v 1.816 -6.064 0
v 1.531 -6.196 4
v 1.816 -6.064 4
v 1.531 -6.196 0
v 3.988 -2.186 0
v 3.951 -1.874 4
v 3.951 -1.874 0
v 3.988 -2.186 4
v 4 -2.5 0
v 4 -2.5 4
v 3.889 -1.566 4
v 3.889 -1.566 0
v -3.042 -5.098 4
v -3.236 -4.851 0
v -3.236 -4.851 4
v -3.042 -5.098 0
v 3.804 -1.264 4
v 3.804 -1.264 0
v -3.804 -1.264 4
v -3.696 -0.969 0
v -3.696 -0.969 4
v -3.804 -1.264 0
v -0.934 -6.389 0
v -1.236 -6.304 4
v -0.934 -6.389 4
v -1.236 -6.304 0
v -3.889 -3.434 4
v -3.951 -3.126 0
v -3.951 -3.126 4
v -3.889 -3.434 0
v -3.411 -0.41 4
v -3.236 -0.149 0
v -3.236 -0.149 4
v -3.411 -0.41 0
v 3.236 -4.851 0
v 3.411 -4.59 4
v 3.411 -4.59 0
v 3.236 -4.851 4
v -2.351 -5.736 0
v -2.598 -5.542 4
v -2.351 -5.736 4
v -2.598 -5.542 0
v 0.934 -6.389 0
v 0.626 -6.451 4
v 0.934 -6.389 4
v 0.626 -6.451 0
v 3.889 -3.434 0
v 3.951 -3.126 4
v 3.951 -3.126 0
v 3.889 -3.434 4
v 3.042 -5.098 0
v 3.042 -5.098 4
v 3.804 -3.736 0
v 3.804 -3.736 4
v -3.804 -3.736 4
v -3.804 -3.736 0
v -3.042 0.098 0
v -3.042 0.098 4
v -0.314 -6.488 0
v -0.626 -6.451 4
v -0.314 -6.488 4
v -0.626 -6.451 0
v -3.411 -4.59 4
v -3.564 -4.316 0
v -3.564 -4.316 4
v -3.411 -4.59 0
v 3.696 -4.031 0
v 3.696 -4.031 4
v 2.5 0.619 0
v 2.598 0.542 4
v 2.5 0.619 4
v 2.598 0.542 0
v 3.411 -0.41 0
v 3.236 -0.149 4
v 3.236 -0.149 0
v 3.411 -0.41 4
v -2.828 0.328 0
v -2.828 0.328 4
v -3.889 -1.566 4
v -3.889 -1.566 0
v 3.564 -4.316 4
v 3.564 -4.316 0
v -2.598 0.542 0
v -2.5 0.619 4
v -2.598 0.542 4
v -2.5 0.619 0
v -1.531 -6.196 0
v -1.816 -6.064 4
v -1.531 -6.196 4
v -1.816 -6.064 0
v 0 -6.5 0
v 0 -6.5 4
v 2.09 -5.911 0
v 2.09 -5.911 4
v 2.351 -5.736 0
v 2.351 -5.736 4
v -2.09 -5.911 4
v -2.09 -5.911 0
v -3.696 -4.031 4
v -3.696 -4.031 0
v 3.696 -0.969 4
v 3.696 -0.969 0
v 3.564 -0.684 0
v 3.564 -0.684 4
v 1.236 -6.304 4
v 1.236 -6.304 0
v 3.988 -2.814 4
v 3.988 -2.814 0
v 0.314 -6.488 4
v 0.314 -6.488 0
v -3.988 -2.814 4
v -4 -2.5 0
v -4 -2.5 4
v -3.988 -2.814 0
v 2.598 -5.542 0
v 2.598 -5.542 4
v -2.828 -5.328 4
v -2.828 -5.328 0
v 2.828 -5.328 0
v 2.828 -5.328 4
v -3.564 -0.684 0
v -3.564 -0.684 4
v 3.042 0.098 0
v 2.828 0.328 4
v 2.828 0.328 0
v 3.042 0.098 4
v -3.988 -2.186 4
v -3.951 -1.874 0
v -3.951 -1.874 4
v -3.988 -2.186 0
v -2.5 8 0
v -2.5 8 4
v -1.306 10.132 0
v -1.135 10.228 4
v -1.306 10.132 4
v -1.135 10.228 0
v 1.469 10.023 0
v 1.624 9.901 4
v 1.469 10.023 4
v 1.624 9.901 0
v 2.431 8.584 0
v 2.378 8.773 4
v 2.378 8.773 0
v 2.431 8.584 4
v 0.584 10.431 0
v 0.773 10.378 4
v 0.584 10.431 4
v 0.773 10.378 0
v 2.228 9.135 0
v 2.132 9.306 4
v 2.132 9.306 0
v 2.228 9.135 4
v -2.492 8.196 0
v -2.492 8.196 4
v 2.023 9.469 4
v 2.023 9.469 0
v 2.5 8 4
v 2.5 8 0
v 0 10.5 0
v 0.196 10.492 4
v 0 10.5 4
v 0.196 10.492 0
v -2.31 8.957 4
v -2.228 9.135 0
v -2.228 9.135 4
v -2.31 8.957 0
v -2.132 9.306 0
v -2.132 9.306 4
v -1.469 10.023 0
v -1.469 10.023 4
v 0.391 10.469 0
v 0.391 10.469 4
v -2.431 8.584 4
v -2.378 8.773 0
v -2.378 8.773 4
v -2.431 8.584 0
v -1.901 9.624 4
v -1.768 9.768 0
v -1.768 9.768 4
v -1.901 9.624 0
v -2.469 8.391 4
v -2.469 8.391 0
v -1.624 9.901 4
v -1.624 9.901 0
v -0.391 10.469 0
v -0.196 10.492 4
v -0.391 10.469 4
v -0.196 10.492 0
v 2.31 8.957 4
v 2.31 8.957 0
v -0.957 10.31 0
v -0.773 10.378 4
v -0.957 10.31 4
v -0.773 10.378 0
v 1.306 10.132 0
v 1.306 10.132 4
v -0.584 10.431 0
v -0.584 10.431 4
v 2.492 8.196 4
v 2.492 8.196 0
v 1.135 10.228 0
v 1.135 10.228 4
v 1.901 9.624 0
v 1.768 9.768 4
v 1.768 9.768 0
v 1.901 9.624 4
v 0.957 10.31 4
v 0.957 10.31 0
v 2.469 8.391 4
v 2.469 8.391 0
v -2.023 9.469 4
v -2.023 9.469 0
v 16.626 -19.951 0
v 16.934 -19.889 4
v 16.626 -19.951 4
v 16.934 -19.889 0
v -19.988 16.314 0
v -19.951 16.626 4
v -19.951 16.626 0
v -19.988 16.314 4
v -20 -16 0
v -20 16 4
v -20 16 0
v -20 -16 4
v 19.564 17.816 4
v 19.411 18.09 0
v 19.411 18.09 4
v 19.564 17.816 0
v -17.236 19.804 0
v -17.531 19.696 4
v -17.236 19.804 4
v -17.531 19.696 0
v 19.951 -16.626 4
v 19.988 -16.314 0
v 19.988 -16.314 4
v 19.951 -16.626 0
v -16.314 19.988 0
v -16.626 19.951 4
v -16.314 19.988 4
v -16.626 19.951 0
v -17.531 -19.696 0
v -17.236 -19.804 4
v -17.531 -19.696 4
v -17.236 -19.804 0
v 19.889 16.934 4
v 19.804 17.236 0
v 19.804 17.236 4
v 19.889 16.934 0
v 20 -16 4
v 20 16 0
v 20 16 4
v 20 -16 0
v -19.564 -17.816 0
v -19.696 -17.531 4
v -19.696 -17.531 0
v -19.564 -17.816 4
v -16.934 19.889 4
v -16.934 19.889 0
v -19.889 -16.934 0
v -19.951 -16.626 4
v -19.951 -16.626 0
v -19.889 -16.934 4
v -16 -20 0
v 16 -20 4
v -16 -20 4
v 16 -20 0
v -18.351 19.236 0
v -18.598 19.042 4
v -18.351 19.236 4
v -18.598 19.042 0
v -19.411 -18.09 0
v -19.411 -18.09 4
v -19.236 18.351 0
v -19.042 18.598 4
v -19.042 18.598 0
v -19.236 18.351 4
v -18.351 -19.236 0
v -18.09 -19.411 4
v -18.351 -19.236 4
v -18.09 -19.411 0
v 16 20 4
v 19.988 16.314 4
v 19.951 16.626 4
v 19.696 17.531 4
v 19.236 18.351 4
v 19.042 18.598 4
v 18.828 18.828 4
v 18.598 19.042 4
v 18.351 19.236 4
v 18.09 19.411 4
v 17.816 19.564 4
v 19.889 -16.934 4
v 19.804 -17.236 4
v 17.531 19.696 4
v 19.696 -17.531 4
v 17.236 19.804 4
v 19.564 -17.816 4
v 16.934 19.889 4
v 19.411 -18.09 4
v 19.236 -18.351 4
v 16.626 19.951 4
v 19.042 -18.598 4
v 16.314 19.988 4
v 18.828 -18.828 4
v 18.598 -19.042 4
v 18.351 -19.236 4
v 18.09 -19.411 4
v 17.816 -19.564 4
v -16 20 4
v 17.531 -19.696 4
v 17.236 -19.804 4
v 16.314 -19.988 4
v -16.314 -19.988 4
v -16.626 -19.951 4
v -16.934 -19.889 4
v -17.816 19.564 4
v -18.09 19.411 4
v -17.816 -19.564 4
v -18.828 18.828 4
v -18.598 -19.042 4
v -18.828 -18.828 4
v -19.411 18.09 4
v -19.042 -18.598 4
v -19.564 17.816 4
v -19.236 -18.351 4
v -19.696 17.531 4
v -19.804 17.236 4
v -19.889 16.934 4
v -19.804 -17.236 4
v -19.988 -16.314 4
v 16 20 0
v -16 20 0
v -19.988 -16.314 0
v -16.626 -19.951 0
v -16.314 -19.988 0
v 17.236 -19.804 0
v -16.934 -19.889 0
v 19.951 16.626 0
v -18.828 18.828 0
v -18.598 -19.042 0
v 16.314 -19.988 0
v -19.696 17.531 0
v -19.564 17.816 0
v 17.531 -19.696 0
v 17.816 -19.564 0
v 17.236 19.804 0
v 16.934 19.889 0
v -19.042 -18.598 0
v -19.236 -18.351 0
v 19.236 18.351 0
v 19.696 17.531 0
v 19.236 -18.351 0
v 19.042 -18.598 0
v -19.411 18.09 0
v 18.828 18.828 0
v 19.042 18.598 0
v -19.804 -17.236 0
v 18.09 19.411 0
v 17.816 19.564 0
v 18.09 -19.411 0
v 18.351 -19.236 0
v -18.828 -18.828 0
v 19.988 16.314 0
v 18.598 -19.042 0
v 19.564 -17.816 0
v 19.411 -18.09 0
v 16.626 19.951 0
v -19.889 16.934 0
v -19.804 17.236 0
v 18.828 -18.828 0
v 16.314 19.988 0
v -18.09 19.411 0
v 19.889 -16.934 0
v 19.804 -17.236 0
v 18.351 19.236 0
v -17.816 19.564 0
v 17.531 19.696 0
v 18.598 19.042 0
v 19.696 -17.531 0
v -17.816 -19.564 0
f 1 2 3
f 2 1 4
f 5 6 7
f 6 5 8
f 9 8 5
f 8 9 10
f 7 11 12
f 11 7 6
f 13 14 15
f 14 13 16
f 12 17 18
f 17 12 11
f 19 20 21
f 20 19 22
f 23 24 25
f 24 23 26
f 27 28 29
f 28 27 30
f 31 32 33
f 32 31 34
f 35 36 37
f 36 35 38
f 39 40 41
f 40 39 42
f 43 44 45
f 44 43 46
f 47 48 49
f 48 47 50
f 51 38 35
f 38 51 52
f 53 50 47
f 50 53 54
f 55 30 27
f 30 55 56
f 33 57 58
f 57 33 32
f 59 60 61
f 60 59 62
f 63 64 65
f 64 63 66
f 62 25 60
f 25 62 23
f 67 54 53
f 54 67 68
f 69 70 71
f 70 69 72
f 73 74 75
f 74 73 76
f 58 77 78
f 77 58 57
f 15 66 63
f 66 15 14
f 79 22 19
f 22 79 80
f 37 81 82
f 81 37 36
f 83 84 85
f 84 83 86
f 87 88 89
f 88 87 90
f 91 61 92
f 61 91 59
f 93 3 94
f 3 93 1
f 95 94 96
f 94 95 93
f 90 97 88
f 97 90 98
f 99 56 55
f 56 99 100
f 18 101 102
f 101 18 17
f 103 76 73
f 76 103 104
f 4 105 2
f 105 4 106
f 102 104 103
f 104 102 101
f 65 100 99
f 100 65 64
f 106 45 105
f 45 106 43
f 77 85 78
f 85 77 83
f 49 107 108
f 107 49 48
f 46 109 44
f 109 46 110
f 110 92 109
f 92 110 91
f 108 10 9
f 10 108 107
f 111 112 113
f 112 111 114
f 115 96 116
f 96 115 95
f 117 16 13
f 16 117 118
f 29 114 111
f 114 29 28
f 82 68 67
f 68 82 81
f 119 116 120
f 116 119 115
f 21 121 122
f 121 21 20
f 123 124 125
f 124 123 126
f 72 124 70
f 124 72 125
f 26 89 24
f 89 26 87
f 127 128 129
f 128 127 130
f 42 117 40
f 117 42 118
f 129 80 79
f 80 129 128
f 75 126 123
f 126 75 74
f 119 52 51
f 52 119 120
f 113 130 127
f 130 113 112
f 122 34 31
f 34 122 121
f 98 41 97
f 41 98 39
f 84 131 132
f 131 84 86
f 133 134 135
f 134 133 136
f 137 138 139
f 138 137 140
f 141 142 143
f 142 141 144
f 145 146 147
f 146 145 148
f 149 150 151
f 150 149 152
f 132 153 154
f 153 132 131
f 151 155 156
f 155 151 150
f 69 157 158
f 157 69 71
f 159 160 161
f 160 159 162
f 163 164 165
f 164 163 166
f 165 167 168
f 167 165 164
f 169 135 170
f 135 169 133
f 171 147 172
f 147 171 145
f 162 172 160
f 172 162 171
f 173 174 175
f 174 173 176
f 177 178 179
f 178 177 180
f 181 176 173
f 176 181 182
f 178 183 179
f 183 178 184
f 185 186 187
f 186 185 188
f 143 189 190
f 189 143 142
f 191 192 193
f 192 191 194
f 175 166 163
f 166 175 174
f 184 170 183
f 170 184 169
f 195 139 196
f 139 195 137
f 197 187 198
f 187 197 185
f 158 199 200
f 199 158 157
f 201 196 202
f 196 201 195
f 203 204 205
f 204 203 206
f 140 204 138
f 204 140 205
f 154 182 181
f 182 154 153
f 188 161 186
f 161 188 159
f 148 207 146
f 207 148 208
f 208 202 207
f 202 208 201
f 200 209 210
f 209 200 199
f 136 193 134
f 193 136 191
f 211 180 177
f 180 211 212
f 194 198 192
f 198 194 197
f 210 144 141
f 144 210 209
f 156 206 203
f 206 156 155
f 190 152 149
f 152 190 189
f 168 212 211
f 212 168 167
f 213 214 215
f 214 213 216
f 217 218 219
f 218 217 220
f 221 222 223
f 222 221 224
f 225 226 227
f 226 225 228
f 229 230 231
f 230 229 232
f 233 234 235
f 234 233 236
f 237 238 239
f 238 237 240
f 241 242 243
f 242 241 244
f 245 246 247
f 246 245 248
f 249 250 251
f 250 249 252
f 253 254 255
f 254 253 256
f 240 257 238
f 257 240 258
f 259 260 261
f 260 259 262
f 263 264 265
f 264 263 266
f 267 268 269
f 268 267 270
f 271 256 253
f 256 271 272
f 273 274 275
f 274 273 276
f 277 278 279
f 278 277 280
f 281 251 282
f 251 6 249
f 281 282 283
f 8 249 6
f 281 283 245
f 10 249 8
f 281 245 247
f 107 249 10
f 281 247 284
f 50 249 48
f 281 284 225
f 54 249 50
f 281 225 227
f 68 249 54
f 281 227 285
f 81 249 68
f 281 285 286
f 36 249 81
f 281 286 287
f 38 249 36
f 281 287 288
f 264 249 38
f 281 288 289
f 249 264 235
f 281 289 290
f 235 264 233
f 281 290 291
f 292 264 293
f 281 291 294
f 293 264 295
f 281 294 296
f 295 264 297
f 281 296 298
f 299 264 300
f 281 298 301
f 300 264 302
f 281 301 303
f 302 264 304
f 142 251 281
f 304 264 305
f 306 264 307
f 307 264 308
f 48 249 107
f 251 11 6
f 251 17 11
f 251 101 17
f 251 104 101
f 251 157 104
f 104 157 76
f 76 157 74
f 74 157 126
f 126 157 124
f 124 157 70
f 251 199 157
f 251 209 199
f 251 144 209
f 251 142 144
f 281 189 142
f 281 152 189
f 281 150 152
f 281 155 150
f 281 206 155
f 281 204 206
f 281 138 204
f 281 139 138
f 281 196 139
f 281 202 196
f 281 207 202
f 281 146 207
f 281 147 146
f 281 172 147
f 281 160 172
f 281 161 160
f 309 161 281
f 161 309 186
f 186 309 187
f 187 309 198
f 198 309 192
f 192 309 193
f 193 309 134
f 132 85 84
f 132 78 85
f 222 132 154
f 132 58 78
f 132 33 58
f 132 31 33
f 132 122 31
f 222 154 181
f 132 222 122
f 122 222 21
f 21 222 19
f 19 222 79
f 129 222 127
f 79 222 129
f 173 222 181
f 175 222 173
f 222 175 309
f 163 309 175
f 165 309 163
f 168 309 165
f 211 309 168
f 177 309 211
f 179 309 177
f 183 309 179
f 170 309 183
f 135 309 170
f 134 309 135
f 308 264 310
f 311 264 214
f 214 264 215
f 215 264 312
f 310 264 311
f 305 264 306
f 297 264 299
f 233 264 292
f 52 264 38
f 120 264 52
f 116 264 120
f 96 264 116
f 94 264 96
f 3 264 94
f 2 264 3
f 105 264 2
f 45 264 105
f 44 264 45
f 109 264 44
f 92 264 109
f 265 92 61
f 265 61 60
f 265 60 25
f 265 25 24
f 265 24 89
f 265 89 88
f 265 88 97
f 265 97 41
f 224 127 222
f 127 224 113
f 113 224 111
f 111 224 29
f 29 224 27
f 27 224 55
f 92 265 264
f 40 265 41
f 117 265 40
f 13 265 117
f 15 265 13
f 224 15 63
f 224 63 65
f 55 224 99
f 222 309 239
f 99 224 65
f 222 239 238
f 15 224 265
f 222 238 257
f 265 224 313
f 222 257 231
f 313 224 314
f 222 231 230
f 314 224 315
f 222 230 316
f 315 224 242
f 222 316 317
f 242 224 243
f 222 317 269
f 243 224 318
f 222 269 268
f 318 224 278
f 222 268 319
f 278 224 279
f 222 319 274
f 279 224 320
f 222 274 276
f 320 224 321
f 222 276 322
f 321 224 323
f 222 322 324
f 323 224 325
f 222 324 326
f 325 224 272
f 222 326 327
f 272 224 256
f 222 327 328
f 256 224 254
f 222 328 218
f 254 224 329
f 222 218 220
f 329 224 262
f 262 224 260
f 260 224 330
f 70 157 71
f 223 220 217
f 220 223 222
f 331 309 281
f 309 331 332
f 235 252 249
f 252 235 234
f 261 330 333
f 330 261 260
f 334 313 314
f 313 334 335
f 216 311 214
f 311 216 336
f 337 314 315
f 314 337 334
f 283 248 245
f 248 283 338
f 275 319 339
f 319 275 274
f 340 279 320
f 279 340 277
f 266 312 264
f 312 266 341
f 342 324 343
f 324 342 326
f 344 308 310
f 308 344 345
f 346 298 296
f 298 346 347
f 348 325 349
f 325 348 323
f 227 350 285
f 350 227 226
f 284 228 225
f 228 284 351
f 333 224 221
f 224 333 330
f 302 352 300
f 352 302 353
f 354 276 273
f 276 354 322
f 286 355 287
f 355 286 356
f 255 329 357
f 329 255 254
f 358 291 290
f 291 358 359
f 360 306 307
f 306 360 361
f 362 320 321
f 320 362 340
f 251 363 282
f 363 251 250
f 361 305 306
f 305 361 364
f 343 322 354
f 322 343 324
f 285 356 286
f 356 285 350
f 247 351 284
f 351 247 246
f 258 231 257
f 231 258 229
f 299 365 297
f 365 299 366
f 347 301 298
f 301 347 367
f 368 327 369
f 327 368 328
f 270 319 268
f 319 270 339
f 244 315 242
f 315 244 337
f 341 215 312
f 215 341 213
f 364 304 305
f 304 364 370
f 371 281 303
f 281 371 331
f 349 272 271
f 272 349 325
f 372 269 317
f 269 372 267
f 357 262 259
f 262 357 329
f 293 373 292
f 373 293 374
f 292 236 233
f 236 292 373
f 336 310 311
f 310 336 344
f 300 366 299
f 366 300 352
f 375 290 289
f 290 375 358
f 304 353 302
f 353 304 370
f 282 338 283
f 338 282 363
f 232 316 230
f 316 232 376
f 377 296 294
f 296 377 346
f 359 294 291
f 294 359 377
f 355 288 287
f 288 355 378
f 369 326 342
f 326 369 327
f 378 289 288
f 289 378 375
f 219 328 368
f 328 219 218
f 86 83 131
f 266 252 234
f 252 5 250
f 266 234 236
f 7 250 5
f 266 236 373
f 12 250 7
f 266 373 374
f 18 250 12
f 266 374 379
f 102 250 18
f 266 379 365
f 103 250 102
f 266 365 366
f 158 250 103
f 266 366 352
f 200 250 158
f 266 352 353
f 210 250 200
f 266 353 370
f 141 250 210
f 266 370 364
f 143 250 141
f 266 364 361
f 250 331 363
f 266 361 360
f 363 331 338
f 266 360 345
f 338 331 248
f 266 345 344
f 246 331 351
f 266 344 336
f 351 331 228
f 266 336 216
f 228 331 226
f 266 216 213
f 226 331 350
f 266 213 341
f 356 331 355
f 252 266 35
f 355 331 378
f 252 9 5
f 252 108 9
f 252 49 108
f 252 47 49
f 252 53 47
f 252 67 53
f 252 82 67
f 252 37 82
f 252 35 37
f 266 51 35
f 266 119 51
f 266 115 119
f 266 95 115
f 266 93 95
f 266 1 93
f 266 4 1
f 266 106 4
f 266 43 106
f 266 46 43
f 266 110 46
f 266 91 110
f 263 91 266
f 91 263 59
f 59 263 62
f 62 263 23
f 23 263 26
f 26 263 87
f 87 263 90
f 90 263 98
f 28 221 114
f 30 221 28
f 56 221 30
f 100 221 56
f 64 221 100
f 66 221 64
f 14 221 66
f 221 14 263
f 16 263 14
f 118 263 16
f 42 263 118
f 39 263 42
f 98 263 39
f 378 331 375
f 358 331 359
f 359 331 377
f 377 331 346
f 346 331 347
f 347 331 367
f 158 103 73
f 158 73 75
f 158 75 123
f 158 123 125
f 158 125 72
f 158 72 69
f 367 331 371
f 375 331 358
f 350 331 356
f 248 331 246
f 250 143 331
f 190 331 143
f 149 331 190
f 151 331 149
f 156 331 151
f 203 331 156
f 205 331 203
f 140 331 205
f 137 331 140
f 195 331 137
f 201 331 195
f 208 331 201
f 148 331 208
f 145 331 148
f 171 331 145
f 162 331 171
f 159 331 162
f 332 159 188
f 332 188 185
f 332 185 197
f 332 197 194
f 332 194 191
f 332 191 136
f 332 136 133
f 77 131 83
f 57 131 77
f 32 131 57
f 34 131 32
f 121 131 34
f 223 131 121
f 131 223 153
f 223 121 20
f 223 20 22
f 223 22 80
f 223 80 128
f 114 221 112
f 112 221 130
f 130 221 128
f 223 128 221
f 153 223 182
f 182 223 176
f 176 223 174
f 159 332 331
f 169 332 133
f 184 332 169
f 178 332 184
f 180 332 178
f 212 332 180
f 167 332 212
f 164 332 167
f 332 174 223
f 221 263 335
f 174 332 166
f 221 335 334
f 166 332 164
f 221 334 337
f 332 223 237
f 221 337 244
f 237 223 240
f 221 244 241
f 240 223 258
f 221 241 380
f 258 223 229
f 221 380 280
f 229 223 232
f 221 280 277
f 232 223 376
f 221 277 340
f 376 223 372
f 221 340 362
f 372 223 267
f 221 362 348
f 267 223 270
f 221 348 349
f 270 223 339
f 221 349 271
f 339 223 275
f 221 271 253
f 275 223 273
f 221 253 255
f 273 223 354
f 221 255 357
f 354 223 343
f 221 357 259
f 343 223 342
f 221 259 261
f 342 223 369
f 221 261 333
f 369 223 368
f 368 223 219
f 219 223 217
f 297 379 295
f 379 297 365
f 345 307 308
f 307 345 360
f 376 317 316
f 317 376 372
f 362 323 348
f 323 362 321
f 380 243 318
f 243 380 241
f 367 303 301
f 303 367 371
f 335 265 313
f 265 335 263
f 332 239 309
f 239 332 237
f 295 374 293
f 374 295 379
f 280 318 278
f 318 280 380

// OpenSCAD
// =============================================================================
// Cap Wall Mount – Hat Display System
// =============================================================================
// A parametric wall-mounted cap/hat holder for displaying baseball caps in a
// grid matrix on a wall for display and selection.
//
// The mount consists of a flat backplate (with a keyhole screw slot) and one
// arch-shaped channel (two concentric arc walls with a gap between them).
// A folded baseball cap's edge rides in the channel, with the bill extending
// forward and the logo/front visible.
//
// Model orientation: backplate in XY plane (Z=0..plate_thickness).
// Arch spans from -X to +X, curving upward in +Z.
// User rotates for printing as needed.
// =============================================================================

// ---------------------------------------------------------------------------
// 1. Constants & Parameters
// ---------------------------------------------------------------------------

// Backplate
plate_width              = 40;    // mm – plate width  (X axis)
plate_height             = 40;    // mm – plate height (Y axis)
plate_thickness          = 4;     // mm – plate thickness (Z axis)
plate_corner_radius      = 4;     // mm – fillet radius on plate corners

// Keyhole screw slot
keyhole_total_height     = 13;    // mm – total height of keyhole slot
keyhole_bottom_diameter  = 8;     // mm – wide hole for screw head
keyhole_top_width        = 5;     // mm – narrow slot for screw shaft
keyhole_offset_y         = 0;     // mm – vertical offset from plate centre

// Arch channel (cap cradle) — one arch spanning -X to +X
arc_radius               = 40;    // mm – radius of the arc curve
arc_sweep                = 60;    // deg – sweep angle per side (total arch = 2 × sweep)
arc_wall_thickness       = 4;     // mm – thickness of each arc wall
arc_channel_gap          = 9;     // mm – gap between inner walls (cap fits here)
arc_depth                = 40;    // mm – depth of arcs (Y axis, matches plate height)

// Build flags
build_main               = true;  // Render the mount (backplate on XY plane)

// Resolution
$fn = 80;

// ---------------------------------------------------------------------------
// 2. Derived Dimensions
// ---------------------------------------------------------------------------

// Channel total width = wall + gap + wall
_channel_total           = arc_wall_thickness + arc_channel_gap + arc_wall_thickness;
// Inner wall radius (smaller arc, inside the channel)
_inner_radius            = arc_radius - arc_wall_thickness - arc_channel_gap;
// Arch peak height above plate front face
_arch_peak_z             = plate_thickness + arc_radius * sin(arc_sweep);
// Arch half-span in X
_arch_half_span          = arc_radius * (1 - cos(arc_sweep));

echo(str("Channel total width: ", _channel_total, " mm (target 17)"));
echo(str("Arch peak height: ", _arch_peak_z, " mm above base"));
echo(str("Arch half-span in X: ", _arch_half_span, " mm (plate half = ",
         plate_width / 2, ")"));
echo(str("Inner wall radius: ", _inner_radius, " mm"));

// Keyhole geometry
_keyhole_bottom_r        = keyhole_bottom_diameter / 2;
_keyhole_top_r           = keyhole_top_width / 2;
_keyhole_bottom_cy       = keyhole_offset_y - keyhole_total_height / 2
                           + _keyhole_bottom_r;
_keyhole_top_cy          = _keyhole_bottom_cy + keyhole_total_height
                           - _keyhole_top_r;

// ---------------------------------------------------------------------------
// 3. Helper / Utility Modules
// ---------------------------------------------------------------------------

// Rounded rectangle centred on XY origin, extruded in +Z
module rounded_rect_centred(size, r) {
    translate([-size.x / 2, -size.y / 2, 0])
        hull() {
            for (x = [r, size.x - r], y = [r, size.y - r])
                translate([x, y, 0])
                    cylinder(r = r, h = size.z);
        }
}

// ---------------------------------------------------------------------------
// 4. Component Modules
// ---------------------------------------------------------------------------

// Keyhole screw slot (cut volume — extends beyond plate surfaces)
module keyhole() {
    translate([0, 0, -0.01]) {
        // Bottom circle (screw head)
        translate([0, _keyhole_bottom_cy, 0])
            cylinder(d = keyhole_bottom_diameter, h = plate_thickness + 0.02);

        // Top narrow slot with semicircle top
        hull() {
            translate([0, _keyhole_bottom_cy, 0])
                cylinder(d = keyhole_top_width, h = plate_thickness + 0.02);
            translate([0, _keyhole_top_cy, 0])
                cylinder(d = keyhole_top_width, h = plate_thickness + 0.02);
        }
    }
}

// Backplate with keyhole
module backplate() {
    difference() {
        rounded_rect_centred(
            [plate_width, plate_height, plate_thickness],
            plate_corner_radius
        );
        keyhole();
    }
}

// Complete arch channel: outer wall + inner wall, left + right halves
module arch_channel() {
    // TODO
    // TODO
    // TODO
    // TODO
}

// Full cap mount assembly
module cap_mount() {
    union() {
        backplate();
        arch_channel();
    }
}

// ---------------------------------------------------------------------------
// 5. Assembly (top-level geometry)
// ---------------------------------------------------------------------------

if (build_main) {
    cap_mount();
}
